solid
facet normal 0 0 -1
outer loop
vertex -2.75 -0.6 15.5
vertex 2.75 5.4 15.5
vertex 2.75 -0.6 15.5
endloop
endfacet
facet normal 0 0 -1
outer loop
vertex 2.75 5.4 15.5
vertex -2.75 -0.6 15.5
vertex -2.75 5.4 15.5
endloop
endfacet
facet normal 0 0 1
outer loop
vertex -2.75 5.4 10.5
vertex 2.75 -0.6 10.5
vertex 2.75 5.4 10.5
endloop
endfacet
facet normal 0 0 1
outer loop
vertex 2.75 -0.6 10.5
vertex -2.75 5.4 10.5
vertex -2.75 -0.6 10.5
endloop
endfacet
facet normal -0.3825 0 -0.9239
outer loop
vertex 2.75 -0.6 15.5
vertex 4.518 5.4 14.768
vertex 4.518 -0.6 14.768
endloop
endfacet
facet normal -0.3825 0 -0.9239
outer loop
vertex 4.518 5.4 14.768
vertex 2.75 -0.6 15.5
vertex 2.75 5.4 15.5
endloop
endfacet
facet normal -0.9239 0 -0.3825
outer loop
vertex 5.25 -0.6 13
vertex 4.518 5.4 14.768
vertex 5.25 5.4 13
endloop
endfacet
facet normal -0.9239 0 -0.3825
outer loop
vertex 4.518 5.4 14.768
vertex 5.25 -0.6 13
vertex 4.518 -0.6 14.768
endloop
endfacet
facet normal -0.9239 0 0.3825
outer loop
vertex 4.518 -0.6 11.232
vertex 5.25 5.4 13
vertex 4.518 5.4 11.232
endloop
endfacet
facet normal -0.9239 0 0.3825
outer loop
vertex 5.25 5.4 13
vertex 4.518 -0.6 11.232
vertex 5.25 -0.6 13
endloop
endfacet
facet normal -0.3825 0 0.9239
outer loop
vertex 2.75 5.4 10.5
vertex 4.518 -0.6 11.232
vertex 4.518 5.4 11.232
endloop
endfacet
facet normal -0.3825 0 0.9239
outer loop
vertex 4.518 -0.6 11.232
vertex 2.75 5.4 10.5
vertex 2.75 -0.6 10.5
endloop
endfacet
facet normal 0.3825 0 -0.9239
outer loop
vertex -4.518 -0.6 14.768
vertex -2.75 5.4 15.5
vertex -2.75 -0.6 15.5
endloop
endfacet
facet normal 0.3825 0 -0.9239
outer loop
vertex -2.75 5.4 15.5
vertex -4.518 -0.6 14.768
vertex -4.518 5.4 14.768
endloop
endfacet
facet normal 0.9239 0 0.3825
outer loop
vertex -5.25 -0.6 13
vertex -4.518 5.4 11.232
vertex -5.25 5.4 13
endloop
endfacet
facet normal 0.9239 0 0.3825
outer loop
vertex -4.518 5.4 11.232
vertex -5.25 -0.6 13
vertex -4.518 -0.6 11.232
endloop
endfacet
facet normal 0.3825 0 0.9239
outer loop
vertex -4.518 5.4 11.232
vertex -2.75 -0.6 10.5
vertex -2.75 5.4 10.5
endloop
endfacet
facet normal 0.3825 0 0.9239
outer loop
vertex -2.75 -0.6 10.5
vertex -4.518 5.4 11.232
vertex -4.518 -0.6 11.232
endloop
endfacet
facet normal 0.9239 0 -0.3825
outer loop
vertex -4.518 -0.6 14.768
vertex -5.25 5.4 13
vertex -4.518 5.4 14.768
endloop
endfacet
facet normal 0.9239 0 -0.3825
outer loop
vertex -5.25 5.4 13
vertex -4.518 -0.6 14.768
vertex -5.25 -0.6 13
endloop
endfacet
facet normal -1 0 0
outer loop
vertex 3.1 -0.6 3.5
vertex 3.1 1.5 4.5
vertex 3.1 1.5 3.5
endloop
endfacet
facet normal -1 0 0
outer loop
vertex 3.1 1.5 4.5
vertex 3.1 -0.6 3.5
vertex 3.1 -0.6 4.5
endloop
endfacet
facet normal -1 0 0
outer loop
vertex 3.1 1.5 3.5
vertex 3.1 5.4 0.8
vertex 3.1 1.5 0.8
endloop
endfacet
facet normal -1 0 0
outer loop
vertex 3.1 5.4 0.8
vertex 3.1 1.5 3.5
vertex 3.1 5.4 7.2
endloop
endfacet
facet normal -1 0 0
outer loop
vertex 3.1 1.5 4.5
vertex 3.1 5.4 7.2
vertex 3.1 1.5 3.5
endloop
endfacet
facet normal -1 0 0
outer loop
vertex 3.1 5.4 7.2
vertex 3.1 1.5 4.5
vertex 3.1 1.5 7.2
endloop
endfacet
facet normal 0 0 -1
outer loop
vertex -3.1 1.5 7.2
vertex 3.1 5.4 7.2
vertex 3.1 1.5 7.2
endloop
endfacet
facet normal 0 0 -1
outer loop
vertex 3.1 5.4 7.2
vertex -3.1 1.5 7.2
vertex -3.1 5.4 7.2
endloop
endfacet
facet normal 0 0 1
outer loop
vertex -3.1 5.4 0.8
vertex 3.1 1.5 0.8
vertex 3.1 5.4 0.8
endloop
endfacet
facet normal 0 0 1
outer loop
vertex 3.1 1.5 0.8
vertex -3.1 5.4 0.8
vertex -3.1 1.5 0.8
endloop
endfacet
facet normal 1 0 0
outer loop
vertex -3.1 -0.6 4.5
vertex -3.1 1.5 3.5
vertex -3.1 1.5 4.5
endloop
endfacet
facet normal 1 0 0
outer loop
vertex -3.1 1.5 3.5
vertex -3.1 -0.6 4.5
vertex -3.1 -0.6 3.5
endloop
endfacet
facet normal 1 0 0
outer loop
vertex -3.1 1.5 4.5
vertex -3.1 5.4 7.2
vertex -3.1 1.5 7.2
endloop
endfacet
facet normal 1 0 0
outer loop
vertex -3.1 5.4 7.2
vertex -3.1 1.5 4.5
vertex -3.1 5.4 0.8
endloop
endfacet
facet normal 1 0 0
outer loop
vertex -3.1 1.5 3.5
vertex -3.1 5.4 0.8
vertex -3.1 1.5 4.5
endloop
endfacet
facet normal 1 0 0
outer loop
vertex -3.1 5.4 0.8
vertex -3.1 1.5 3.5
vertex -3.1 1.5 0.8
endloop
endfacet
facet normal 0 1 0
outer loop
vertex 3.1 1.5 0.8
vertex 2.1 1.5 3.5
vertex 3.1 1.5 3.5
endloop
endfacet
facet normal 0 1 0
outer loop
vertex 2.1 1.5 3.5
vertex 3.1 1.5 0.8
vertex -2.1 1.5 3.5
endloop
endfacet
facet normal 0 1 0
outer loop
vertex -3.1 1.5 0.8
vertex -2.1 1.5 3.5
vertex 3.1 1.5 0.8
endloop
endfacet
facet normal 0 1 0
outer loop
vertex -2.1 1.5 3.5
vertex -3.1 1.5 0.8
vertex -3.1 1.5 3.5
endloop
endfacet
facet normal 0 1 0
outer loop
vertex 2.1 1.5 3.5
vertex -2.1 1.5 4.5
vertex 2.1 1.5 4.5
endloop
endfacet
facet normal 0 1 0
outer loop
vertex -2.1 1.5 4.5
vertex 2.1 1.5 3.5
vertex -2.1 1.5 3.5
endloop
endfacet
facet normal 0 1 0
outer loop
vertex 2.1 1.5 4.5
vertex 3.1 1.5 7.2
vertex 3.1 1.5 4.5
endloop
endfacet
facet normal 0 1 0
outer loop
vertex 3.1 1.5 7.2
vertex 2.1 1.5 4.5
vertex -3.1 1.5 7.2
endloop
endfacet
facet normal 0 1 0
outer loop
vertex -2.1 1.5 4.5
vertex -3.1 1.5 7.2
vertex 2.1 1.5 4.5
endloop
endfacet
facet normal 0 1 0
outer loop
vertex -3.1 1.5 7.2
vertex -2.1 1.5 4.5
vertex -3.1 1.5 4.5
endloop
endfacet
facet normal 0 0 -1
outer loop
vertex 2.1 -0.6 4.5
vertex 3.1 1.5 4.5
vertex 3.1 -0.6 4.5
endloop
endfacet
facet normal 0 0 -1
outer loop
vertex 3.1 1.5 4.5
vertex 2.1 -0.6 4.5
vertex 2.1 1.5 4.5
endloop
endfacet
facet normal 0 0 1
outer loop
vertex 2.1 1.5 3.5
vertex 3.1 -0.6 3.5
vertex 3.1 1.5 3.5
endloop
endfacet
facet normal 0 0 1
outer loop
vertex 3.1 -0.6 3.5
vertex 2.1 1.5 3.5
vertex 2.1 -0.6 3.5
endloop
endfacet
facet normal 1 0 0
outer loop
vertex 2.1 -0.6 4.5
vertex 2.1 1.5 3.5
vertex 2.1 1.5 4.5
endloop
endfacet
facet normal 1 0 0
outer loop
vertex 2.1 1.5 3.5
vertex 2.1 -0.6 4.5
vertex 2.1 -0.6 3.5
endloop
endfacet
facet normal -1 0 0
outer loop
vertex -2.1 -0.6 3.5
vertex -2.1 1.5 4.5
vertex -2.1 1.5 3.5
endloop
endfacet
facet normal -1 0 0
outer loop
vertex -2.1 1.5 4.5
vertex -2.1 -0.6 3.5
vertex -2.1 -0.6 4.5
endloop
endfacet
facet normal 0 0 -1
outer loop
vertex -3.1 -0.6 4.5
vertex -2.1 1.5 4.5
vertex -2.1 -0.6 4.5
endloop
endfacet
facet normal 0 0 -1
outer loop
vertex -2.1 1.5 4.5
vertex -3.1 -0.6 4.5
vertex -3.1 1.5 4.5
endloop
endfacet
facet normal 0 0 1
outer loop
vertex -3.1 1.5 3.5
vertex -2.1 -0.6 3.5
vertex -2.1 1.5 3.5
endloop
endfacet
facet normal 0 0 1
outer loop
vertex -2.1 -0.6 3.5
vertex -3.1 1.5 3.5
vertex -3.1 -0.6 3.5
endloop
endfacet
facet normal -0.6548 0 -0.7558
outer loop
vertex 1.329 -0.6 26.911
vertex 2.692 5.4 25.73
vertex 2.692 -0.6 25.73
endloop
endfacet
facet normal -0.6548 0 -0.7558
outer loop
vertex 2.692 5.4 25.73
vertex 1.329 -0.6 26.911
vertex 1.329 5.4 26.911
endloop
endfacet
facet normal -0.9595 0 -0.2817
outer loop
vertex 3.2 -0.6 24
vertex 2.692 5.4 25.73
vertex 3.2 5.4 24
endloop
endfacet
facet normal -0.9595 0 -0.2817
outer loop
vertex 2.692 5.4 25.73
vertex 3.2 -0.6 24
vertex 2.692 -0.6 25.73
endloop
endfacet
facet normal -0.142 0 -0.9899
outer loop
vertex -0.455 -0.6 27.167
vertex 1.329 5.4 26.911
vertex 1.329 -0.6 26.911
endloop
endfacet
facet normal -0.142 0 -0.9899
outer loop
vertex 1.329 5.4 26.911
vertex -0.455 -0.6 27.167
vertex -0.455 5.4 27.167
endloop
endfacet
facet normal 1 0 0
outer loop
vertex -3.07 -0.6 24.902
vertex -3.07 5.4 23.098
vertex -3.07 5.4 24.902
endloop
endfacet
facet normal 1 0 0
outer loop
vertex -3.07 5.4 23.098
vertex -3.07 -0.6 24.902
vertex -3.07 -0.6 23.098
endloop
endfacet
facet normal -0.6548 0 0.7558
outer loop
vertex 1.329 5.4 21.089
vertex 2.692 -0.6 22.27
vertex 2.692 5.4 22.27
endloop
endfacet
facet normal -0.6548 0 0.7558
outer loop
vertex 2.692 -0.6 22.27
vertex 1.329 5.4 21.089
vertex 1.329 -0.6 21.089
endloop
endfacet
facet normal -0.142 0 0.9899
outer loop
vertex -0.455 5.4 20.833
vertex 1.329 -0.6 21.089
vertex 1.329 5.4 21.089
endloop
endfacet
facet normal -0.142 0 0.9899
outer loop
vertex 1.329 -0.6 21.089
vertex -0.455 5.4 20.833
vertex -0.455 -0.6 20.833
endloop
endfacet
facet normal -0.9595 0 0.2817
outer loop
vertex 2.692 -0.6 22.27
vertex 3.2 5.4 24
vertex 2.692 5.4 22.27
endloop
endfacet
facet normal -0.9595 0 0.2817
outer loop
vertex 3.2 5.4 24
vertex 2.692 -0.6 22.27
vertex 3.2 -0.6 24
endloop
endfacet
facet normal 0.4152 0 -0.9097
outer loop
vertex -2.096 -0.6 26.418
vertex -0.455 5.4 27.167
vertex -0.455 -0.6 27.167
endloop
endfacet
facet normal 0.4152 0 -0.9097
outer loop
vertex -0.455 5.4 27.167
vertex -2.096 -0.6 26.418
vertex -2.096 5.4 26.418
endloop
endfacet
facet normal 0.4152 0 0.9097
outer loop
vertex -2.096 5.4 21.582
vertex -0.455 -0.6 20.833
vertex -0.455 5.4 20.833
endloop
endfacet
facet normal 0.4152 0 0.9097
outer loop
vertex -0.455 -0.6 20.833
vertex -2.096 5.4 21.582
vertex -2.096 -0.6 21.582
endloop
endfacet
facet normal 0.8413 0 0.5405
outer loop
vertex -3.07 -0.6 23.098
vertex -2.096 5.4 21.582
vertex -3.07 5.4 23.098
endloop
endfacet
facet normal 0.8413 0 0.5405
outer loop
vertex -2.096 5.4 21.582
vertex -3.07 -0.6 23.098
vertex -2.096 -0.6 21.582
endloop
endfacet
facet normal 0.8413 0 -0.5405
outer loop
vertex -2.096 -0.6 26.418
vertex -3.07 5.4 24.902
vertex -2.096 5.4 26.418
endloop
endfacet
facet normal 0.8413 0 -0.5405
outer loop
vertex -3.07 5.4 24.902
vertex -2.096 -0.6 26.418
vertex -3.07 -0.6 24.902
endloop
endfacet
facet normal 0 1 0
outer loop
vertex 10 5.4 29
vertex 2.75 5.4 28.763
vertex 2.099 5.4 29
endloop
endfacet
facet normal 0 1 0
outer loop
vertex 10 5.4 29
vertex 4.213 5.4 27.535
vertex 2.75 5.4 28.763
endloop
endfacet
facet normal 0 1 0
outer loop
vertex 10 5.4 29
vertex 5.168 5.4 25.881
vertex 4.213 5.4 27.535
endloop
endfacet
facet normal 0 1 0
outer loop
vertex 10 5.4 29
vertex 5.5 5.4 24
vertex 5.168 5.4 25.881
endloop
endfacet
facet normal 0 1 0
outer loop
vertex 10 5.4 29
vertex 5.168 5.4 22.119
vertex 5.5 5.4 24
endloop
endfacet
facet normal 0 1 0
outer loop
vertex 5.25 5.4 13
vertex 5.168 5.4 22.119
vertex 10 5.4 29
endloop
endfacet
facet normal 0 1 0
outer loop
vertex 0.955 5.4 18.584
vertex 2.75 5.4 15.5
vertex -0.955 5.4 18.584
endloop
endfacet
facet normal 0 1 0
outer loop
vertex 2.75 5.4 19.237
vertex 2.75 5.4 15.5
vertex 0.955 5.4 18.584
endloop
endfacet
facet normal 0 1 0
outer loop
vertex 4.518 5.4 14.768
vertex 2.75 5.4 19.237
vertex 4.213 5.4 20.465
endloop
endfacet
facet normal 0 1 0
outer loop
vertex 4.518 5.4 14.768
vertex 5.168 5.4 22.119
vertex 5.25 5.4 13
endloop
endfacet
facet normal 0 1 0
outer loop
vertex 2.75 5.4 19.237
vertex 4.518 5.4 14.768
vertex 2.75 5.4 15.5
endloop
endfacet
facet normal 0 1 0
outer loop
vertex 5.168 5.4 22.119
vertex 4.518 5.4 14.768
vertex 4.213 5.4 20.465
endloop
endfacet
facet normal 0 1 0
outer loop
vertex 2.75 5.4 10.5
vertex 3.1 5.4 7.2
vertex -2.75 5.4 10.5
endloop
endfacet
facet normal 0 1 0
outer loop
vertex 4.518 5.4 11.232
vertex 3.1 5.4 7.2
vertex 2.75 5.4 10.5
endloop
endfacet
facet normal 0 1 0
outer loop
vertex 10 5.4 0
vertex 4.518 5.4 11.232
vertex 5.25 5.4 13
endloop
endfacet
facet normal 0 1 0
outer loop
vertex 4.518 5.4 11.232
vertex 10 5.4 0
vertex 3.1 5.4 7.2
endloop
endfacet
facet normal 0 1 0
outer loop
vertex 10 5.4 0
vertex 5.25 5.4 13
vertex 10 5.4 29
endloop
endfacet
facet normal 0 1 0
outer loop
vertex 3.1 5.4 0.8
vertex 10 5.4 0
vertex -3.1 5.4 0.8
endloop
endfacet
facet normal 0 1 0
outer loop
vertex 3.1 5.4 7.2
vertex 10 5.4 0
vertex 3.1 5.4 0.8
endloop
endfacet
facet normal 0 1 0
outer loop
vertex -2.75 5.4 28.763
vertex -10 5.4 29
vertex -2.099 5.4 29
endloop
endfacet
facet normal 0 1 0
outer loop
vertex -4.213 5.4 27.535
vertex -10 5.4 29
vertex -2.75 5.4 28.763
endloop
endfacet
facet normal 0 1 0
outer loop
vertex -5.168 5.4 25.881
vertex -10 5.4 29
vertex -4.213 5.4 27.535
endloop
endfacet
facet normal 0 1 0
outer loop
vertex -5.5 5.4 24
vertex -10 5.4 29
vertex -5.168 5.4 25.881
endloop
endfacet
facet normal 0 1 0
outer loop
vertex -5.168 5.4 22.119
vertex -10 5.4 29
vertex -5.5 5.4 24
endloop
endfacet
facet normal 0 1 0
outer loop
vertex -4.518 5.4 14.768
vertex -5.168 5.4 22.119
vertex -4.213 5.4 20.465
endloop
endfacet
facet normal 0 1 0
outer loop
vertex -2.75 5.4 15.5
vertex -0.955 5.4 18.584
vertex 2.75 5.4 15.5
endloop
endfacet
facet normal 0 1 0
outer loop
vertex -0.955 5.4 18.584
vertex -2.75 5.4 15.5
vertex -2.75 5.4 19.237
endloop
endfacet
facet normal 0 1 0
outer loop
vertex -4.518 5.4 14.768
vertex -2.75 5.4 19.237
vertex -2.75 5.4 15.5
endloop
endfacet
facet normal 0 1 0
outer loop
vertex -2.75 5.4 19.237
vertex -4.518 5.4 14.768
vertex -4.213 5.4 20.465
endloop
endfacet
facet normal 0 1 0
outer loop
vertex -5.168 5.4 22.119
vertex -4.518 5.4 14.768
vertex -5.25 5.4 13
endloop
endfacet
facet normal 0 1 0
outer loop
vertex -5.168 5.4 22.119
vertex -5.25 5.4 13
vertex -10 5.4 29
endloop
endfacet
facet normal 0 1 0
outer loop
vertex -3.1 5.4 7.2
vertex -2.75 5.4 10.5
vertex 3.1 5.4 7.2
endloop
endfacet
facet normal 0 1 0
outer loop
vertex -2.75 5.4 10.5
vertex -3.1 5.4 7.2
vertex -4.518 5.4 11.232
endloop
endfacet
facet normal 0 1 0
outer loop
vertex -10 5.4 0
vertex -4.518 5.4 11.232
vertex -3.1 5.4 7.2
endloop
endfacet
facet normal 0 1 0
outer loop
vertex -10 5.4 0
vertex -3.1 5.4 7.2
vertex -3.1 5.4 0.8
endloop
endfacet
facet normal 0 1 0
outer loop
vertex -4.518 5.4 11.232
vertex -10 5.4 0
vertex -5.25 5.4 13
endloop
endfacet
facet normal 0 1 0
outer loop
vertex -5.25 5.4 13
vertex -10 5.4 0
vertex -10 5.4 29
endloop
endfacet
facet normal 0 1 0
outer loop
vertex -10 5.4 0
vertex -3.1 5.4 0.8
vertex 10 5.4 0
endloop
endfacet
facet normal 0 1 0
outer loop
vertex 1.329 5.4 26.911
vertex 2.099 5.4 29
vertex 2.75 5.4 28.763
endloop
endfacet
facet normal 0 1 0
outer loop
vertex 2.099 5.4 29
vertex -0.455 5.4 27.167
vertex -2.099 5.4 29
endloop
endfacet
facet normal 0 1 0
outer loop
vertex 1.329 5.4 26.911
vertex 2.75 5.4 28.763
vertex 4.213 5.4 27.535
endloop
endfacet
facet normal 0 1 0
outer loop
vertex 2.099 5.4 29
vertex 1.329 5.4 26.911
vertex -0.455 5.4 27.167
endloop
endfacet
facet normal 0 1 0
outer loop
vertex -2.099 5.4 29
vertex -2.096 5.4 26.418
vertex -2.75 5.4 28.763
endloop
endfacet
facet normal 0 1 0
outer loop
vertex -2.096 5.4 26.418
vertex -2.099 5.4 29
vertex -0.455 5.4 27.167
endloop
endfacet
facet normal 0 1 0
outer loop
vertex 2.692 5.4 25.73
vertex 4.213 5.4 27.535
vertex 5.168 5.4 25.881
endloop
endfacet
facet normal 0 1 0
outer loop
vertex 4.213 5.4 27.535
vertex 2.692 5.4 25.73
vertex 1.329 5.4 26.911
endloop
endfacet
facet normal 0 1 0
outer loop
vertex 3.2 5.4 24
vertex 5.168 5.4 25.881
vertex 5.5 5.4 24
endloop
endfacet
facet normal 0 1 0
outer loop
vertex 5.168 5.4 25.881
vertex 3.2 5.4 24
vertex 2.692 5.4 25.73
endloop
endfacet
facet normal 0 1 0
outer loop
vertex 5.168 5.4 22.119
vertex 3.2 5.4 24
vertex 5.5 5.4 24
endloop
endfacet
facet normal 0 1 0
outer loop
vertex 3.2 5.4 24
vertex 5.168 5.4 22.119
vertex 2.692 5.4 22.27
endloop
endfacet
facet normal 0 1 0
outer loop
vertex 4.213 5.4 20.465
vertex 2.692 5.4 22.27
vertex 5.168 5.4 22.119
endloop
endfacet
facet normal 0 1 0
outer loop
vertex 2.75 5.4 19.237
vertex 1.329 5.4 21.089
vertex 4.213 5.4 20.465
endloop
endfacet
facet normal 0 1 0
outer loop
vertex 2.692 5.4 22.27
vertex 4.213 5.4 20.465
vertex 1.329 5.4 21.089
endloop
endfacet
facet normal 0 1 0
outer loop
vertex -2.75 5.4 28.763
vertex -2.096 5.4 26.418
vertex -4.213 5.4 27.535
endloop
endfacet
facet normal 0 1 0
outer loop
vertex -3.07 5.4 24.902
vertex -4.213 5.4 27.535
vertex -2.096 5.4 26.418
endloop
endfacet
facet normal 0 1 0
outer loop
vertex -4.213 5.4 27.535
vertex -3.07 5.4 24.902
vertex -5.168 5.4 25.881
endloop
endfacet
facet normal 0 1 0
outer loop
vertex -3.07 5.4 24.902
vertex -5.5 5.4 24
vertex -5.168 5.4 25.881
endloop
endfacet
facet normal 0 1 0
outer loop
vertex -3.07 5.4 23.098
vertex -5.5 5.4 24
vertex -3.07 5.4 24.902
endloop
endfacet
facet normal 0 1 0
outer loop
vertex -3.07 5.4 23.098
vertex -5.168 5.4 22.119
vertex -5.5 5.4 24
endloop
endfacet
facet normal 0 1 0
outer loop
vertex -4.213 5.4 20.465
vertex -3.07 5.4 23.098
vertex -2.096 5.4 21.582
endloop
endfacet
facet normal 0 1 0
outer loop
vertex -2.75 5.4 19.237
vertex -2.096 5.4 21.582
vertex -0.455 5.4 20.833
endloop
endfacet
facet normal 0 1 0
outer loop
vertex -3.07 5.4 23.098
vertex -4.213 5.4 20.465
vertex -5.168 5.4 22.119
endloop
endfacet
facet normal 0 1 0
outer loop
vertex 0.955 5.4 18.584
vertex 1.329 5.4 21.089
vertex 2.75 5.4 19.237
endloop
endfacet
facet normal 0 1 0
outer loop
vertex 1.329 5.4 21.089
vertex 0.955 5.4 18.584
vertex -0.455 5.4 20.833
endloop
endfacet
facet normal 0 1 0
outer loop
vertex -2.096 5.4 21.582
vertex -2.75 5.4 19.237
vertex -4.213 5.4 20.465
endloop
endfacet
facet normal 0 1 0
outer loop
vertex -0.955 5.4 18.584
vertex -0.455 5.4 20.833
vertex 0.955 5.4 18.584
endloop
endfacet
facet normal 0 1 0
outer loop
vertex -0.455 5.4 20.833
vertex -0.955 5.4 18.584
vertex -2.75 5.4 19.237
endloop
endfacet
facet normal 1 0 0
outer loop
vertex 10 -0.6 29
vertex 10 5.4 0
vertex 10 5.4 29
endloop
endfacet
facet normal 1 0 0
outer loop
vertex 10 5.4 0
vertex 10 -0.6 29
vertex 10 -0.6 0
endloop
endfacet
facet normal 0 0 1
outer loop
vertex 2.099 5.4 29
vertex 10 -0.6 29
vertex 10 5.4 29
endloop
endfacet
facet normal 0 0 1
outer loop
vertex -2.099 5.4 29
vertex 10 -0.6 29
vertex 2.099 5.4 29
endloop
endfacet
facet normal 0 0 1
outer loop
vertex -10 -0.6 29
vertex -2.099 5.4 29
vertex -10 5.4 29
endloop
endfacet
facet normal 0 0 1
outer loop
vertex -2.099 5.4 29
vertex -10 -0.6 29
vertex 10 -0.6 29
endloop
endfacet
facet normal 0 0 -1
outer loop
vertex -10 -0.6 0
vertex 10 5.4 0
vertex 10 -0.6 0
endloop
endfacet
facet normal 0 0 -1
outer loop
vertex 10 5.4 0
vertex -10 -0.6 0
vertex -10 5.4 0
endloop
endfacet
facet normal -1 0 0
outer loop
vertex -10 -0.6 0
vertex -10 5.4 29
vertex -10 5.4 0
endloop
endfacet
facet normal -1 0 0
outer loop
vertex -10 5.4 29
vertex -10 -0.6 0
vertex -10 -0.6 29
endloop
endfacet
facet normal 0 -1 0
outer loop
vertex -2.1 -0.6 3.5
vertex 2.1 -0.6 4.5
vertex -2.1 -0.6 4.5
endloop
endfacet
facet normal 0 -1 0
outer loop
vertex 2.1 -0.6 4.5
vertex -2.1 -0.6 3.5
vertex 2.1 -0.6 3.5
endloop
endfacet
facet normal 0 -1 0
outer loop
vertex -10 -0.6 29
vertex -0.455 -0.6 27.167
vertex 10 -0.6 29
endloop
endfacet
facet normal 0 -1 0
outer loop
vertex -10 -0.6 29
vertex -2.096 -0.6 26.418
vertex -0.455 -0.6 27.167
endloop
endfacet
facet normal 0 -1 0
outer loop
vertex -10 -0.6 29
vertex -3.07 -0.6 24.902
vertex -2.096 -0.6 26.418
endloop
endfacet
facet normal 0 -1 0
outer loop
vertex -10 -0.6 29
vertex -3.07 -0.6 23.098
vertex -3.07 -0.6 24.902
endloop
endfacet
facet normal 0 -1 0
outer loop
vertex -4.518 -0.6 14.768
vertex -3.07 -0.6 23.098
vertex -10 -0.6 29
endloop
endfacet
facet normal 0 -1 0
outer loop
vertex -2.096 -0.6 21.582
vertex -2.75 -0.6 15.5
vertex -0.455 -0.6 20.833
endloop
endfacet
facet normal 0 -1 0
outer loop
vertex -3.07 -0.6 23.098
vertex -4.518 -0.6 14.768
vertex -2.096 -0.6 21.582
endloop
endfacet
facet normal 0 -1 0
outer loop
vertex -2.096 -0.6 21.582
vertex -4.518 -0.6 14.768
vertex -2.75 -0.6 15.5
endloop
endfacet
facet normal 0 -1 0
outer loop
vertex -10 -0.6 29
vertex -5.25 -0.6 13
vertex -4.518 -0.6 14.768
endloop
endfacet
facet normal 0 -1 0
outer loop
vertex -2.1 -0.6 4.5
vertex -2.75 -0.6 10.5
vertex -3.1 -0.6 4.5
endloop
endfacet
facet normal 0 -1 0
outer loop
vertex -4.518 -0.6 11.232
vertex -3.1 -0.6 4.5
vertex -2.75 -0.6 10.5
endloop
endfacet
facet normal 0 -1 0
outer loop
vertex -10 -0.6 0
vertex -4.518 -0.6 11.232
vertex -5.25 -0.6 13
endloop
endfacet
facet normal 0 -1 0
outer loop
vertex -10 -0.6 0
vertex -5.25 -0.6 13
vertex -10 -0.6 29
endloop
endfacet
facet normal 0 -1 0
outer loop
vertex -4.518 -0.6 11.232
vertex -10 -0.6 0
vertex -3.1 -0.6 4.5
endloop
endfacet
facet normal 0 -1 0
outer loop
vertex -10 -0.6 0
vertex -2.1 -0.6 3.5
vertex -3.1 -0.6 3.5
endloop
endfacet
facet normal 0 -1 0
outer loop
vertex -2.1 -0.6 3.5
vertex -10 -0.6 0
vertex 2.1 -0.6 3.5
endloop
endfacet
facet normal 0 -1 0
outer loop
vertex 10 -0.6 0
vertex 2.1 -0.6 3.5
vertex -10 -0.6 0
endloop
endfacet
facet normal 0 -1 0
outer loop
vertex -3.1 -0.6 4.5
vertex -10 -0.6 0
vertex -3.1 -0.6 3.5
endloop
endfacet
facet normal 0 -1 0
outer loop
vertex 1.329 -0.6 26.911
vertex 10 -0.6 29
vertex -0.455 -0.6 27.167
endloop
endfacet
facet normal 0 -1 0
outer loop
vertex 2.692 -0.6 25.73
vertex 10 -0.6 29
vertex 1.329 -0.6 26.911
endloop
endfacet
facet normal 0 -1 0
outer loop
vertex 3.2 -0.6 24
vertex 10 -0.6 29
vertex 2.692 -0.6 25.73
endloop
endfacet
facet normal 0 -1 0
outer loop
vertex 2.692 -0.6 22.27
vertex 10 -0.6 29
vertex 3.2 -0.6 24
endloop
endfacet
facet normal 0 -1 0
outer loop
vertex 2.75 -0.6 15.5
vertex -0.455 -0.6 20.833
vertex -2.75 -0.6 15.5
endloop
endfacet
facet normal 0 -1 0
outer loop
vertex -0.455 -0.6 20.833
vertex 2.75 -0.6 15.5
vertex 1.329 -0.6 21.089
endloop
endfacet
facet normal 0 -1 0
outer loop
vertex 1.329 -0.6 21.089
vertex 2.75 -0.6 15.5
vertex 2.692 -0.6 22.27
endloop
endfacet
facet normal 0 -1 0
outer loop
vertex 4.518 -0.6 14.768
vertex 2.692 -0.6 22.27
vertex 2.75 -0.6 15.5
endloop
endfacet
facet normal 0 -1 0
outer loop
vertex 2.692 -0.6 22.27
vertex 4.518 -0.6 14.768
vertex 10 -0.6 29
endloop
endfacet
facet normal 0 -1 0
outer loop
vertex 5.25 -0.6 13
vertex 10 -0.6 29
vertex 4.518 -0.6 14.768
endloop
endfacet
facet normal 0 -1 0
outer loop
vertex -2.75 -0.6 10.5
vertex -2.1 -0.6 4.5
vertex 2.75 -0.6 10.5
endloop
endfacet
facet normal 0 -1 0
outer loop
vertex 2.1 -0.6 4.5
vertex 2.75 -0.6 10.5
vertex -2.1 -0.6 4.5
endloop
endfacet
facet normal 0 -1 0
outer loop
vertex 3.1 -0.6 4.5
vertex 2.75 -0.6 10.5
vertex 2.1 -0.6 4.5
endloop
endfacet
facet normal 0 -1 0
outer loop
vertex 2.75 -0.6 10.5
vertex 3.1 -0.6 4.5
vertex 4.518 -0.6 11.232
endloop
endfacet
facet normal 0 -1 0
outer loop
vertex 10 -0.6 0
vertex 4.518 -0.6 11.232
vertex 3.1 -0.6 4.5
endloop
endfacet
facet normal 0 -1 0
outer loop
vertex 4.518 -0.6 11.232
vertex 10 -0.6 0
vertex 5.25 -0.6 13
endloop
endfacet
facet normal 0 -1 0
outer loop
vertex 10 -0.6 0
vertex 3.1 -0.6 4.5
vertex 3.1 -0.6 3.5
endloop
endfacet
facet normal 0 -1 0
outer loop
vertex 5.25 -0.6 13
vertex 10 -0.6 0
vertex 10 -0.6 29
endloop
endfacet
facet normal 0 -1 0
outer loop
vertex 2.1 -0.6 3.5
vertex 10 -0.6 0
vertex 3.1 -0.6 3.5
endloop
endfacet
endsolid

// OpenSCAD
difference () {
    union () {
        translate ([0, 2.4, 14.5]) {
            rotate ([0, 0, 0]) {
                cube ([20, 6, 29], true);
            }
        }
    }
    union () {
        // usb c
        translate ([0, 0, 13]) {
            rotate ([0, 0, 0]) {
                cube ([5.5, 20, 5], true);
            }
            translate ([2.75, 10, 0]) {
                rotate ([90, 0, 0]) {
                    cylinder(20, 2.5, 2.5);
                }
            }
            translate ([-2.75, 10, 0]) {
                rotate ([90, 0, 0]) {
                    cylinder(20, 2.5, 2.5);
                }
            }
        }
        // reset
        translate ([0, 4, 4]) {
            rotate ([0, 0, 0]) {
                cube ([6.2, 5, 6.4], true);
            }
        }
        translate ([2.6, 6, 4]) {
            rotate ([0, 0, 0]) {
                cube ([1, 20, 1], true);
            }
        }
        translate ([-2.6, 6, 4]) {
            rotate ([0, 0, 0]) {
                cube ([1, 20, 1], true);
            }
        }
        // on off switch
        translate ([0, 6, 24]) {
            rotate ([90, 0, 0]) {
                cylinder(20, 3.2, 3.2);
            }
        }
        translate ([0, 15.4, 24]) {
            rotate ([90, 0, 0]) {
                cylinder(10, 5.5, 5.5);
            }
        }
        
        // general
        // translate ([0, -3, 5]) {
        //    rotate ([0, 0, 0]) {
        //        cube ([14, 10, 20], true);
        //    }
        // }
    }
}
